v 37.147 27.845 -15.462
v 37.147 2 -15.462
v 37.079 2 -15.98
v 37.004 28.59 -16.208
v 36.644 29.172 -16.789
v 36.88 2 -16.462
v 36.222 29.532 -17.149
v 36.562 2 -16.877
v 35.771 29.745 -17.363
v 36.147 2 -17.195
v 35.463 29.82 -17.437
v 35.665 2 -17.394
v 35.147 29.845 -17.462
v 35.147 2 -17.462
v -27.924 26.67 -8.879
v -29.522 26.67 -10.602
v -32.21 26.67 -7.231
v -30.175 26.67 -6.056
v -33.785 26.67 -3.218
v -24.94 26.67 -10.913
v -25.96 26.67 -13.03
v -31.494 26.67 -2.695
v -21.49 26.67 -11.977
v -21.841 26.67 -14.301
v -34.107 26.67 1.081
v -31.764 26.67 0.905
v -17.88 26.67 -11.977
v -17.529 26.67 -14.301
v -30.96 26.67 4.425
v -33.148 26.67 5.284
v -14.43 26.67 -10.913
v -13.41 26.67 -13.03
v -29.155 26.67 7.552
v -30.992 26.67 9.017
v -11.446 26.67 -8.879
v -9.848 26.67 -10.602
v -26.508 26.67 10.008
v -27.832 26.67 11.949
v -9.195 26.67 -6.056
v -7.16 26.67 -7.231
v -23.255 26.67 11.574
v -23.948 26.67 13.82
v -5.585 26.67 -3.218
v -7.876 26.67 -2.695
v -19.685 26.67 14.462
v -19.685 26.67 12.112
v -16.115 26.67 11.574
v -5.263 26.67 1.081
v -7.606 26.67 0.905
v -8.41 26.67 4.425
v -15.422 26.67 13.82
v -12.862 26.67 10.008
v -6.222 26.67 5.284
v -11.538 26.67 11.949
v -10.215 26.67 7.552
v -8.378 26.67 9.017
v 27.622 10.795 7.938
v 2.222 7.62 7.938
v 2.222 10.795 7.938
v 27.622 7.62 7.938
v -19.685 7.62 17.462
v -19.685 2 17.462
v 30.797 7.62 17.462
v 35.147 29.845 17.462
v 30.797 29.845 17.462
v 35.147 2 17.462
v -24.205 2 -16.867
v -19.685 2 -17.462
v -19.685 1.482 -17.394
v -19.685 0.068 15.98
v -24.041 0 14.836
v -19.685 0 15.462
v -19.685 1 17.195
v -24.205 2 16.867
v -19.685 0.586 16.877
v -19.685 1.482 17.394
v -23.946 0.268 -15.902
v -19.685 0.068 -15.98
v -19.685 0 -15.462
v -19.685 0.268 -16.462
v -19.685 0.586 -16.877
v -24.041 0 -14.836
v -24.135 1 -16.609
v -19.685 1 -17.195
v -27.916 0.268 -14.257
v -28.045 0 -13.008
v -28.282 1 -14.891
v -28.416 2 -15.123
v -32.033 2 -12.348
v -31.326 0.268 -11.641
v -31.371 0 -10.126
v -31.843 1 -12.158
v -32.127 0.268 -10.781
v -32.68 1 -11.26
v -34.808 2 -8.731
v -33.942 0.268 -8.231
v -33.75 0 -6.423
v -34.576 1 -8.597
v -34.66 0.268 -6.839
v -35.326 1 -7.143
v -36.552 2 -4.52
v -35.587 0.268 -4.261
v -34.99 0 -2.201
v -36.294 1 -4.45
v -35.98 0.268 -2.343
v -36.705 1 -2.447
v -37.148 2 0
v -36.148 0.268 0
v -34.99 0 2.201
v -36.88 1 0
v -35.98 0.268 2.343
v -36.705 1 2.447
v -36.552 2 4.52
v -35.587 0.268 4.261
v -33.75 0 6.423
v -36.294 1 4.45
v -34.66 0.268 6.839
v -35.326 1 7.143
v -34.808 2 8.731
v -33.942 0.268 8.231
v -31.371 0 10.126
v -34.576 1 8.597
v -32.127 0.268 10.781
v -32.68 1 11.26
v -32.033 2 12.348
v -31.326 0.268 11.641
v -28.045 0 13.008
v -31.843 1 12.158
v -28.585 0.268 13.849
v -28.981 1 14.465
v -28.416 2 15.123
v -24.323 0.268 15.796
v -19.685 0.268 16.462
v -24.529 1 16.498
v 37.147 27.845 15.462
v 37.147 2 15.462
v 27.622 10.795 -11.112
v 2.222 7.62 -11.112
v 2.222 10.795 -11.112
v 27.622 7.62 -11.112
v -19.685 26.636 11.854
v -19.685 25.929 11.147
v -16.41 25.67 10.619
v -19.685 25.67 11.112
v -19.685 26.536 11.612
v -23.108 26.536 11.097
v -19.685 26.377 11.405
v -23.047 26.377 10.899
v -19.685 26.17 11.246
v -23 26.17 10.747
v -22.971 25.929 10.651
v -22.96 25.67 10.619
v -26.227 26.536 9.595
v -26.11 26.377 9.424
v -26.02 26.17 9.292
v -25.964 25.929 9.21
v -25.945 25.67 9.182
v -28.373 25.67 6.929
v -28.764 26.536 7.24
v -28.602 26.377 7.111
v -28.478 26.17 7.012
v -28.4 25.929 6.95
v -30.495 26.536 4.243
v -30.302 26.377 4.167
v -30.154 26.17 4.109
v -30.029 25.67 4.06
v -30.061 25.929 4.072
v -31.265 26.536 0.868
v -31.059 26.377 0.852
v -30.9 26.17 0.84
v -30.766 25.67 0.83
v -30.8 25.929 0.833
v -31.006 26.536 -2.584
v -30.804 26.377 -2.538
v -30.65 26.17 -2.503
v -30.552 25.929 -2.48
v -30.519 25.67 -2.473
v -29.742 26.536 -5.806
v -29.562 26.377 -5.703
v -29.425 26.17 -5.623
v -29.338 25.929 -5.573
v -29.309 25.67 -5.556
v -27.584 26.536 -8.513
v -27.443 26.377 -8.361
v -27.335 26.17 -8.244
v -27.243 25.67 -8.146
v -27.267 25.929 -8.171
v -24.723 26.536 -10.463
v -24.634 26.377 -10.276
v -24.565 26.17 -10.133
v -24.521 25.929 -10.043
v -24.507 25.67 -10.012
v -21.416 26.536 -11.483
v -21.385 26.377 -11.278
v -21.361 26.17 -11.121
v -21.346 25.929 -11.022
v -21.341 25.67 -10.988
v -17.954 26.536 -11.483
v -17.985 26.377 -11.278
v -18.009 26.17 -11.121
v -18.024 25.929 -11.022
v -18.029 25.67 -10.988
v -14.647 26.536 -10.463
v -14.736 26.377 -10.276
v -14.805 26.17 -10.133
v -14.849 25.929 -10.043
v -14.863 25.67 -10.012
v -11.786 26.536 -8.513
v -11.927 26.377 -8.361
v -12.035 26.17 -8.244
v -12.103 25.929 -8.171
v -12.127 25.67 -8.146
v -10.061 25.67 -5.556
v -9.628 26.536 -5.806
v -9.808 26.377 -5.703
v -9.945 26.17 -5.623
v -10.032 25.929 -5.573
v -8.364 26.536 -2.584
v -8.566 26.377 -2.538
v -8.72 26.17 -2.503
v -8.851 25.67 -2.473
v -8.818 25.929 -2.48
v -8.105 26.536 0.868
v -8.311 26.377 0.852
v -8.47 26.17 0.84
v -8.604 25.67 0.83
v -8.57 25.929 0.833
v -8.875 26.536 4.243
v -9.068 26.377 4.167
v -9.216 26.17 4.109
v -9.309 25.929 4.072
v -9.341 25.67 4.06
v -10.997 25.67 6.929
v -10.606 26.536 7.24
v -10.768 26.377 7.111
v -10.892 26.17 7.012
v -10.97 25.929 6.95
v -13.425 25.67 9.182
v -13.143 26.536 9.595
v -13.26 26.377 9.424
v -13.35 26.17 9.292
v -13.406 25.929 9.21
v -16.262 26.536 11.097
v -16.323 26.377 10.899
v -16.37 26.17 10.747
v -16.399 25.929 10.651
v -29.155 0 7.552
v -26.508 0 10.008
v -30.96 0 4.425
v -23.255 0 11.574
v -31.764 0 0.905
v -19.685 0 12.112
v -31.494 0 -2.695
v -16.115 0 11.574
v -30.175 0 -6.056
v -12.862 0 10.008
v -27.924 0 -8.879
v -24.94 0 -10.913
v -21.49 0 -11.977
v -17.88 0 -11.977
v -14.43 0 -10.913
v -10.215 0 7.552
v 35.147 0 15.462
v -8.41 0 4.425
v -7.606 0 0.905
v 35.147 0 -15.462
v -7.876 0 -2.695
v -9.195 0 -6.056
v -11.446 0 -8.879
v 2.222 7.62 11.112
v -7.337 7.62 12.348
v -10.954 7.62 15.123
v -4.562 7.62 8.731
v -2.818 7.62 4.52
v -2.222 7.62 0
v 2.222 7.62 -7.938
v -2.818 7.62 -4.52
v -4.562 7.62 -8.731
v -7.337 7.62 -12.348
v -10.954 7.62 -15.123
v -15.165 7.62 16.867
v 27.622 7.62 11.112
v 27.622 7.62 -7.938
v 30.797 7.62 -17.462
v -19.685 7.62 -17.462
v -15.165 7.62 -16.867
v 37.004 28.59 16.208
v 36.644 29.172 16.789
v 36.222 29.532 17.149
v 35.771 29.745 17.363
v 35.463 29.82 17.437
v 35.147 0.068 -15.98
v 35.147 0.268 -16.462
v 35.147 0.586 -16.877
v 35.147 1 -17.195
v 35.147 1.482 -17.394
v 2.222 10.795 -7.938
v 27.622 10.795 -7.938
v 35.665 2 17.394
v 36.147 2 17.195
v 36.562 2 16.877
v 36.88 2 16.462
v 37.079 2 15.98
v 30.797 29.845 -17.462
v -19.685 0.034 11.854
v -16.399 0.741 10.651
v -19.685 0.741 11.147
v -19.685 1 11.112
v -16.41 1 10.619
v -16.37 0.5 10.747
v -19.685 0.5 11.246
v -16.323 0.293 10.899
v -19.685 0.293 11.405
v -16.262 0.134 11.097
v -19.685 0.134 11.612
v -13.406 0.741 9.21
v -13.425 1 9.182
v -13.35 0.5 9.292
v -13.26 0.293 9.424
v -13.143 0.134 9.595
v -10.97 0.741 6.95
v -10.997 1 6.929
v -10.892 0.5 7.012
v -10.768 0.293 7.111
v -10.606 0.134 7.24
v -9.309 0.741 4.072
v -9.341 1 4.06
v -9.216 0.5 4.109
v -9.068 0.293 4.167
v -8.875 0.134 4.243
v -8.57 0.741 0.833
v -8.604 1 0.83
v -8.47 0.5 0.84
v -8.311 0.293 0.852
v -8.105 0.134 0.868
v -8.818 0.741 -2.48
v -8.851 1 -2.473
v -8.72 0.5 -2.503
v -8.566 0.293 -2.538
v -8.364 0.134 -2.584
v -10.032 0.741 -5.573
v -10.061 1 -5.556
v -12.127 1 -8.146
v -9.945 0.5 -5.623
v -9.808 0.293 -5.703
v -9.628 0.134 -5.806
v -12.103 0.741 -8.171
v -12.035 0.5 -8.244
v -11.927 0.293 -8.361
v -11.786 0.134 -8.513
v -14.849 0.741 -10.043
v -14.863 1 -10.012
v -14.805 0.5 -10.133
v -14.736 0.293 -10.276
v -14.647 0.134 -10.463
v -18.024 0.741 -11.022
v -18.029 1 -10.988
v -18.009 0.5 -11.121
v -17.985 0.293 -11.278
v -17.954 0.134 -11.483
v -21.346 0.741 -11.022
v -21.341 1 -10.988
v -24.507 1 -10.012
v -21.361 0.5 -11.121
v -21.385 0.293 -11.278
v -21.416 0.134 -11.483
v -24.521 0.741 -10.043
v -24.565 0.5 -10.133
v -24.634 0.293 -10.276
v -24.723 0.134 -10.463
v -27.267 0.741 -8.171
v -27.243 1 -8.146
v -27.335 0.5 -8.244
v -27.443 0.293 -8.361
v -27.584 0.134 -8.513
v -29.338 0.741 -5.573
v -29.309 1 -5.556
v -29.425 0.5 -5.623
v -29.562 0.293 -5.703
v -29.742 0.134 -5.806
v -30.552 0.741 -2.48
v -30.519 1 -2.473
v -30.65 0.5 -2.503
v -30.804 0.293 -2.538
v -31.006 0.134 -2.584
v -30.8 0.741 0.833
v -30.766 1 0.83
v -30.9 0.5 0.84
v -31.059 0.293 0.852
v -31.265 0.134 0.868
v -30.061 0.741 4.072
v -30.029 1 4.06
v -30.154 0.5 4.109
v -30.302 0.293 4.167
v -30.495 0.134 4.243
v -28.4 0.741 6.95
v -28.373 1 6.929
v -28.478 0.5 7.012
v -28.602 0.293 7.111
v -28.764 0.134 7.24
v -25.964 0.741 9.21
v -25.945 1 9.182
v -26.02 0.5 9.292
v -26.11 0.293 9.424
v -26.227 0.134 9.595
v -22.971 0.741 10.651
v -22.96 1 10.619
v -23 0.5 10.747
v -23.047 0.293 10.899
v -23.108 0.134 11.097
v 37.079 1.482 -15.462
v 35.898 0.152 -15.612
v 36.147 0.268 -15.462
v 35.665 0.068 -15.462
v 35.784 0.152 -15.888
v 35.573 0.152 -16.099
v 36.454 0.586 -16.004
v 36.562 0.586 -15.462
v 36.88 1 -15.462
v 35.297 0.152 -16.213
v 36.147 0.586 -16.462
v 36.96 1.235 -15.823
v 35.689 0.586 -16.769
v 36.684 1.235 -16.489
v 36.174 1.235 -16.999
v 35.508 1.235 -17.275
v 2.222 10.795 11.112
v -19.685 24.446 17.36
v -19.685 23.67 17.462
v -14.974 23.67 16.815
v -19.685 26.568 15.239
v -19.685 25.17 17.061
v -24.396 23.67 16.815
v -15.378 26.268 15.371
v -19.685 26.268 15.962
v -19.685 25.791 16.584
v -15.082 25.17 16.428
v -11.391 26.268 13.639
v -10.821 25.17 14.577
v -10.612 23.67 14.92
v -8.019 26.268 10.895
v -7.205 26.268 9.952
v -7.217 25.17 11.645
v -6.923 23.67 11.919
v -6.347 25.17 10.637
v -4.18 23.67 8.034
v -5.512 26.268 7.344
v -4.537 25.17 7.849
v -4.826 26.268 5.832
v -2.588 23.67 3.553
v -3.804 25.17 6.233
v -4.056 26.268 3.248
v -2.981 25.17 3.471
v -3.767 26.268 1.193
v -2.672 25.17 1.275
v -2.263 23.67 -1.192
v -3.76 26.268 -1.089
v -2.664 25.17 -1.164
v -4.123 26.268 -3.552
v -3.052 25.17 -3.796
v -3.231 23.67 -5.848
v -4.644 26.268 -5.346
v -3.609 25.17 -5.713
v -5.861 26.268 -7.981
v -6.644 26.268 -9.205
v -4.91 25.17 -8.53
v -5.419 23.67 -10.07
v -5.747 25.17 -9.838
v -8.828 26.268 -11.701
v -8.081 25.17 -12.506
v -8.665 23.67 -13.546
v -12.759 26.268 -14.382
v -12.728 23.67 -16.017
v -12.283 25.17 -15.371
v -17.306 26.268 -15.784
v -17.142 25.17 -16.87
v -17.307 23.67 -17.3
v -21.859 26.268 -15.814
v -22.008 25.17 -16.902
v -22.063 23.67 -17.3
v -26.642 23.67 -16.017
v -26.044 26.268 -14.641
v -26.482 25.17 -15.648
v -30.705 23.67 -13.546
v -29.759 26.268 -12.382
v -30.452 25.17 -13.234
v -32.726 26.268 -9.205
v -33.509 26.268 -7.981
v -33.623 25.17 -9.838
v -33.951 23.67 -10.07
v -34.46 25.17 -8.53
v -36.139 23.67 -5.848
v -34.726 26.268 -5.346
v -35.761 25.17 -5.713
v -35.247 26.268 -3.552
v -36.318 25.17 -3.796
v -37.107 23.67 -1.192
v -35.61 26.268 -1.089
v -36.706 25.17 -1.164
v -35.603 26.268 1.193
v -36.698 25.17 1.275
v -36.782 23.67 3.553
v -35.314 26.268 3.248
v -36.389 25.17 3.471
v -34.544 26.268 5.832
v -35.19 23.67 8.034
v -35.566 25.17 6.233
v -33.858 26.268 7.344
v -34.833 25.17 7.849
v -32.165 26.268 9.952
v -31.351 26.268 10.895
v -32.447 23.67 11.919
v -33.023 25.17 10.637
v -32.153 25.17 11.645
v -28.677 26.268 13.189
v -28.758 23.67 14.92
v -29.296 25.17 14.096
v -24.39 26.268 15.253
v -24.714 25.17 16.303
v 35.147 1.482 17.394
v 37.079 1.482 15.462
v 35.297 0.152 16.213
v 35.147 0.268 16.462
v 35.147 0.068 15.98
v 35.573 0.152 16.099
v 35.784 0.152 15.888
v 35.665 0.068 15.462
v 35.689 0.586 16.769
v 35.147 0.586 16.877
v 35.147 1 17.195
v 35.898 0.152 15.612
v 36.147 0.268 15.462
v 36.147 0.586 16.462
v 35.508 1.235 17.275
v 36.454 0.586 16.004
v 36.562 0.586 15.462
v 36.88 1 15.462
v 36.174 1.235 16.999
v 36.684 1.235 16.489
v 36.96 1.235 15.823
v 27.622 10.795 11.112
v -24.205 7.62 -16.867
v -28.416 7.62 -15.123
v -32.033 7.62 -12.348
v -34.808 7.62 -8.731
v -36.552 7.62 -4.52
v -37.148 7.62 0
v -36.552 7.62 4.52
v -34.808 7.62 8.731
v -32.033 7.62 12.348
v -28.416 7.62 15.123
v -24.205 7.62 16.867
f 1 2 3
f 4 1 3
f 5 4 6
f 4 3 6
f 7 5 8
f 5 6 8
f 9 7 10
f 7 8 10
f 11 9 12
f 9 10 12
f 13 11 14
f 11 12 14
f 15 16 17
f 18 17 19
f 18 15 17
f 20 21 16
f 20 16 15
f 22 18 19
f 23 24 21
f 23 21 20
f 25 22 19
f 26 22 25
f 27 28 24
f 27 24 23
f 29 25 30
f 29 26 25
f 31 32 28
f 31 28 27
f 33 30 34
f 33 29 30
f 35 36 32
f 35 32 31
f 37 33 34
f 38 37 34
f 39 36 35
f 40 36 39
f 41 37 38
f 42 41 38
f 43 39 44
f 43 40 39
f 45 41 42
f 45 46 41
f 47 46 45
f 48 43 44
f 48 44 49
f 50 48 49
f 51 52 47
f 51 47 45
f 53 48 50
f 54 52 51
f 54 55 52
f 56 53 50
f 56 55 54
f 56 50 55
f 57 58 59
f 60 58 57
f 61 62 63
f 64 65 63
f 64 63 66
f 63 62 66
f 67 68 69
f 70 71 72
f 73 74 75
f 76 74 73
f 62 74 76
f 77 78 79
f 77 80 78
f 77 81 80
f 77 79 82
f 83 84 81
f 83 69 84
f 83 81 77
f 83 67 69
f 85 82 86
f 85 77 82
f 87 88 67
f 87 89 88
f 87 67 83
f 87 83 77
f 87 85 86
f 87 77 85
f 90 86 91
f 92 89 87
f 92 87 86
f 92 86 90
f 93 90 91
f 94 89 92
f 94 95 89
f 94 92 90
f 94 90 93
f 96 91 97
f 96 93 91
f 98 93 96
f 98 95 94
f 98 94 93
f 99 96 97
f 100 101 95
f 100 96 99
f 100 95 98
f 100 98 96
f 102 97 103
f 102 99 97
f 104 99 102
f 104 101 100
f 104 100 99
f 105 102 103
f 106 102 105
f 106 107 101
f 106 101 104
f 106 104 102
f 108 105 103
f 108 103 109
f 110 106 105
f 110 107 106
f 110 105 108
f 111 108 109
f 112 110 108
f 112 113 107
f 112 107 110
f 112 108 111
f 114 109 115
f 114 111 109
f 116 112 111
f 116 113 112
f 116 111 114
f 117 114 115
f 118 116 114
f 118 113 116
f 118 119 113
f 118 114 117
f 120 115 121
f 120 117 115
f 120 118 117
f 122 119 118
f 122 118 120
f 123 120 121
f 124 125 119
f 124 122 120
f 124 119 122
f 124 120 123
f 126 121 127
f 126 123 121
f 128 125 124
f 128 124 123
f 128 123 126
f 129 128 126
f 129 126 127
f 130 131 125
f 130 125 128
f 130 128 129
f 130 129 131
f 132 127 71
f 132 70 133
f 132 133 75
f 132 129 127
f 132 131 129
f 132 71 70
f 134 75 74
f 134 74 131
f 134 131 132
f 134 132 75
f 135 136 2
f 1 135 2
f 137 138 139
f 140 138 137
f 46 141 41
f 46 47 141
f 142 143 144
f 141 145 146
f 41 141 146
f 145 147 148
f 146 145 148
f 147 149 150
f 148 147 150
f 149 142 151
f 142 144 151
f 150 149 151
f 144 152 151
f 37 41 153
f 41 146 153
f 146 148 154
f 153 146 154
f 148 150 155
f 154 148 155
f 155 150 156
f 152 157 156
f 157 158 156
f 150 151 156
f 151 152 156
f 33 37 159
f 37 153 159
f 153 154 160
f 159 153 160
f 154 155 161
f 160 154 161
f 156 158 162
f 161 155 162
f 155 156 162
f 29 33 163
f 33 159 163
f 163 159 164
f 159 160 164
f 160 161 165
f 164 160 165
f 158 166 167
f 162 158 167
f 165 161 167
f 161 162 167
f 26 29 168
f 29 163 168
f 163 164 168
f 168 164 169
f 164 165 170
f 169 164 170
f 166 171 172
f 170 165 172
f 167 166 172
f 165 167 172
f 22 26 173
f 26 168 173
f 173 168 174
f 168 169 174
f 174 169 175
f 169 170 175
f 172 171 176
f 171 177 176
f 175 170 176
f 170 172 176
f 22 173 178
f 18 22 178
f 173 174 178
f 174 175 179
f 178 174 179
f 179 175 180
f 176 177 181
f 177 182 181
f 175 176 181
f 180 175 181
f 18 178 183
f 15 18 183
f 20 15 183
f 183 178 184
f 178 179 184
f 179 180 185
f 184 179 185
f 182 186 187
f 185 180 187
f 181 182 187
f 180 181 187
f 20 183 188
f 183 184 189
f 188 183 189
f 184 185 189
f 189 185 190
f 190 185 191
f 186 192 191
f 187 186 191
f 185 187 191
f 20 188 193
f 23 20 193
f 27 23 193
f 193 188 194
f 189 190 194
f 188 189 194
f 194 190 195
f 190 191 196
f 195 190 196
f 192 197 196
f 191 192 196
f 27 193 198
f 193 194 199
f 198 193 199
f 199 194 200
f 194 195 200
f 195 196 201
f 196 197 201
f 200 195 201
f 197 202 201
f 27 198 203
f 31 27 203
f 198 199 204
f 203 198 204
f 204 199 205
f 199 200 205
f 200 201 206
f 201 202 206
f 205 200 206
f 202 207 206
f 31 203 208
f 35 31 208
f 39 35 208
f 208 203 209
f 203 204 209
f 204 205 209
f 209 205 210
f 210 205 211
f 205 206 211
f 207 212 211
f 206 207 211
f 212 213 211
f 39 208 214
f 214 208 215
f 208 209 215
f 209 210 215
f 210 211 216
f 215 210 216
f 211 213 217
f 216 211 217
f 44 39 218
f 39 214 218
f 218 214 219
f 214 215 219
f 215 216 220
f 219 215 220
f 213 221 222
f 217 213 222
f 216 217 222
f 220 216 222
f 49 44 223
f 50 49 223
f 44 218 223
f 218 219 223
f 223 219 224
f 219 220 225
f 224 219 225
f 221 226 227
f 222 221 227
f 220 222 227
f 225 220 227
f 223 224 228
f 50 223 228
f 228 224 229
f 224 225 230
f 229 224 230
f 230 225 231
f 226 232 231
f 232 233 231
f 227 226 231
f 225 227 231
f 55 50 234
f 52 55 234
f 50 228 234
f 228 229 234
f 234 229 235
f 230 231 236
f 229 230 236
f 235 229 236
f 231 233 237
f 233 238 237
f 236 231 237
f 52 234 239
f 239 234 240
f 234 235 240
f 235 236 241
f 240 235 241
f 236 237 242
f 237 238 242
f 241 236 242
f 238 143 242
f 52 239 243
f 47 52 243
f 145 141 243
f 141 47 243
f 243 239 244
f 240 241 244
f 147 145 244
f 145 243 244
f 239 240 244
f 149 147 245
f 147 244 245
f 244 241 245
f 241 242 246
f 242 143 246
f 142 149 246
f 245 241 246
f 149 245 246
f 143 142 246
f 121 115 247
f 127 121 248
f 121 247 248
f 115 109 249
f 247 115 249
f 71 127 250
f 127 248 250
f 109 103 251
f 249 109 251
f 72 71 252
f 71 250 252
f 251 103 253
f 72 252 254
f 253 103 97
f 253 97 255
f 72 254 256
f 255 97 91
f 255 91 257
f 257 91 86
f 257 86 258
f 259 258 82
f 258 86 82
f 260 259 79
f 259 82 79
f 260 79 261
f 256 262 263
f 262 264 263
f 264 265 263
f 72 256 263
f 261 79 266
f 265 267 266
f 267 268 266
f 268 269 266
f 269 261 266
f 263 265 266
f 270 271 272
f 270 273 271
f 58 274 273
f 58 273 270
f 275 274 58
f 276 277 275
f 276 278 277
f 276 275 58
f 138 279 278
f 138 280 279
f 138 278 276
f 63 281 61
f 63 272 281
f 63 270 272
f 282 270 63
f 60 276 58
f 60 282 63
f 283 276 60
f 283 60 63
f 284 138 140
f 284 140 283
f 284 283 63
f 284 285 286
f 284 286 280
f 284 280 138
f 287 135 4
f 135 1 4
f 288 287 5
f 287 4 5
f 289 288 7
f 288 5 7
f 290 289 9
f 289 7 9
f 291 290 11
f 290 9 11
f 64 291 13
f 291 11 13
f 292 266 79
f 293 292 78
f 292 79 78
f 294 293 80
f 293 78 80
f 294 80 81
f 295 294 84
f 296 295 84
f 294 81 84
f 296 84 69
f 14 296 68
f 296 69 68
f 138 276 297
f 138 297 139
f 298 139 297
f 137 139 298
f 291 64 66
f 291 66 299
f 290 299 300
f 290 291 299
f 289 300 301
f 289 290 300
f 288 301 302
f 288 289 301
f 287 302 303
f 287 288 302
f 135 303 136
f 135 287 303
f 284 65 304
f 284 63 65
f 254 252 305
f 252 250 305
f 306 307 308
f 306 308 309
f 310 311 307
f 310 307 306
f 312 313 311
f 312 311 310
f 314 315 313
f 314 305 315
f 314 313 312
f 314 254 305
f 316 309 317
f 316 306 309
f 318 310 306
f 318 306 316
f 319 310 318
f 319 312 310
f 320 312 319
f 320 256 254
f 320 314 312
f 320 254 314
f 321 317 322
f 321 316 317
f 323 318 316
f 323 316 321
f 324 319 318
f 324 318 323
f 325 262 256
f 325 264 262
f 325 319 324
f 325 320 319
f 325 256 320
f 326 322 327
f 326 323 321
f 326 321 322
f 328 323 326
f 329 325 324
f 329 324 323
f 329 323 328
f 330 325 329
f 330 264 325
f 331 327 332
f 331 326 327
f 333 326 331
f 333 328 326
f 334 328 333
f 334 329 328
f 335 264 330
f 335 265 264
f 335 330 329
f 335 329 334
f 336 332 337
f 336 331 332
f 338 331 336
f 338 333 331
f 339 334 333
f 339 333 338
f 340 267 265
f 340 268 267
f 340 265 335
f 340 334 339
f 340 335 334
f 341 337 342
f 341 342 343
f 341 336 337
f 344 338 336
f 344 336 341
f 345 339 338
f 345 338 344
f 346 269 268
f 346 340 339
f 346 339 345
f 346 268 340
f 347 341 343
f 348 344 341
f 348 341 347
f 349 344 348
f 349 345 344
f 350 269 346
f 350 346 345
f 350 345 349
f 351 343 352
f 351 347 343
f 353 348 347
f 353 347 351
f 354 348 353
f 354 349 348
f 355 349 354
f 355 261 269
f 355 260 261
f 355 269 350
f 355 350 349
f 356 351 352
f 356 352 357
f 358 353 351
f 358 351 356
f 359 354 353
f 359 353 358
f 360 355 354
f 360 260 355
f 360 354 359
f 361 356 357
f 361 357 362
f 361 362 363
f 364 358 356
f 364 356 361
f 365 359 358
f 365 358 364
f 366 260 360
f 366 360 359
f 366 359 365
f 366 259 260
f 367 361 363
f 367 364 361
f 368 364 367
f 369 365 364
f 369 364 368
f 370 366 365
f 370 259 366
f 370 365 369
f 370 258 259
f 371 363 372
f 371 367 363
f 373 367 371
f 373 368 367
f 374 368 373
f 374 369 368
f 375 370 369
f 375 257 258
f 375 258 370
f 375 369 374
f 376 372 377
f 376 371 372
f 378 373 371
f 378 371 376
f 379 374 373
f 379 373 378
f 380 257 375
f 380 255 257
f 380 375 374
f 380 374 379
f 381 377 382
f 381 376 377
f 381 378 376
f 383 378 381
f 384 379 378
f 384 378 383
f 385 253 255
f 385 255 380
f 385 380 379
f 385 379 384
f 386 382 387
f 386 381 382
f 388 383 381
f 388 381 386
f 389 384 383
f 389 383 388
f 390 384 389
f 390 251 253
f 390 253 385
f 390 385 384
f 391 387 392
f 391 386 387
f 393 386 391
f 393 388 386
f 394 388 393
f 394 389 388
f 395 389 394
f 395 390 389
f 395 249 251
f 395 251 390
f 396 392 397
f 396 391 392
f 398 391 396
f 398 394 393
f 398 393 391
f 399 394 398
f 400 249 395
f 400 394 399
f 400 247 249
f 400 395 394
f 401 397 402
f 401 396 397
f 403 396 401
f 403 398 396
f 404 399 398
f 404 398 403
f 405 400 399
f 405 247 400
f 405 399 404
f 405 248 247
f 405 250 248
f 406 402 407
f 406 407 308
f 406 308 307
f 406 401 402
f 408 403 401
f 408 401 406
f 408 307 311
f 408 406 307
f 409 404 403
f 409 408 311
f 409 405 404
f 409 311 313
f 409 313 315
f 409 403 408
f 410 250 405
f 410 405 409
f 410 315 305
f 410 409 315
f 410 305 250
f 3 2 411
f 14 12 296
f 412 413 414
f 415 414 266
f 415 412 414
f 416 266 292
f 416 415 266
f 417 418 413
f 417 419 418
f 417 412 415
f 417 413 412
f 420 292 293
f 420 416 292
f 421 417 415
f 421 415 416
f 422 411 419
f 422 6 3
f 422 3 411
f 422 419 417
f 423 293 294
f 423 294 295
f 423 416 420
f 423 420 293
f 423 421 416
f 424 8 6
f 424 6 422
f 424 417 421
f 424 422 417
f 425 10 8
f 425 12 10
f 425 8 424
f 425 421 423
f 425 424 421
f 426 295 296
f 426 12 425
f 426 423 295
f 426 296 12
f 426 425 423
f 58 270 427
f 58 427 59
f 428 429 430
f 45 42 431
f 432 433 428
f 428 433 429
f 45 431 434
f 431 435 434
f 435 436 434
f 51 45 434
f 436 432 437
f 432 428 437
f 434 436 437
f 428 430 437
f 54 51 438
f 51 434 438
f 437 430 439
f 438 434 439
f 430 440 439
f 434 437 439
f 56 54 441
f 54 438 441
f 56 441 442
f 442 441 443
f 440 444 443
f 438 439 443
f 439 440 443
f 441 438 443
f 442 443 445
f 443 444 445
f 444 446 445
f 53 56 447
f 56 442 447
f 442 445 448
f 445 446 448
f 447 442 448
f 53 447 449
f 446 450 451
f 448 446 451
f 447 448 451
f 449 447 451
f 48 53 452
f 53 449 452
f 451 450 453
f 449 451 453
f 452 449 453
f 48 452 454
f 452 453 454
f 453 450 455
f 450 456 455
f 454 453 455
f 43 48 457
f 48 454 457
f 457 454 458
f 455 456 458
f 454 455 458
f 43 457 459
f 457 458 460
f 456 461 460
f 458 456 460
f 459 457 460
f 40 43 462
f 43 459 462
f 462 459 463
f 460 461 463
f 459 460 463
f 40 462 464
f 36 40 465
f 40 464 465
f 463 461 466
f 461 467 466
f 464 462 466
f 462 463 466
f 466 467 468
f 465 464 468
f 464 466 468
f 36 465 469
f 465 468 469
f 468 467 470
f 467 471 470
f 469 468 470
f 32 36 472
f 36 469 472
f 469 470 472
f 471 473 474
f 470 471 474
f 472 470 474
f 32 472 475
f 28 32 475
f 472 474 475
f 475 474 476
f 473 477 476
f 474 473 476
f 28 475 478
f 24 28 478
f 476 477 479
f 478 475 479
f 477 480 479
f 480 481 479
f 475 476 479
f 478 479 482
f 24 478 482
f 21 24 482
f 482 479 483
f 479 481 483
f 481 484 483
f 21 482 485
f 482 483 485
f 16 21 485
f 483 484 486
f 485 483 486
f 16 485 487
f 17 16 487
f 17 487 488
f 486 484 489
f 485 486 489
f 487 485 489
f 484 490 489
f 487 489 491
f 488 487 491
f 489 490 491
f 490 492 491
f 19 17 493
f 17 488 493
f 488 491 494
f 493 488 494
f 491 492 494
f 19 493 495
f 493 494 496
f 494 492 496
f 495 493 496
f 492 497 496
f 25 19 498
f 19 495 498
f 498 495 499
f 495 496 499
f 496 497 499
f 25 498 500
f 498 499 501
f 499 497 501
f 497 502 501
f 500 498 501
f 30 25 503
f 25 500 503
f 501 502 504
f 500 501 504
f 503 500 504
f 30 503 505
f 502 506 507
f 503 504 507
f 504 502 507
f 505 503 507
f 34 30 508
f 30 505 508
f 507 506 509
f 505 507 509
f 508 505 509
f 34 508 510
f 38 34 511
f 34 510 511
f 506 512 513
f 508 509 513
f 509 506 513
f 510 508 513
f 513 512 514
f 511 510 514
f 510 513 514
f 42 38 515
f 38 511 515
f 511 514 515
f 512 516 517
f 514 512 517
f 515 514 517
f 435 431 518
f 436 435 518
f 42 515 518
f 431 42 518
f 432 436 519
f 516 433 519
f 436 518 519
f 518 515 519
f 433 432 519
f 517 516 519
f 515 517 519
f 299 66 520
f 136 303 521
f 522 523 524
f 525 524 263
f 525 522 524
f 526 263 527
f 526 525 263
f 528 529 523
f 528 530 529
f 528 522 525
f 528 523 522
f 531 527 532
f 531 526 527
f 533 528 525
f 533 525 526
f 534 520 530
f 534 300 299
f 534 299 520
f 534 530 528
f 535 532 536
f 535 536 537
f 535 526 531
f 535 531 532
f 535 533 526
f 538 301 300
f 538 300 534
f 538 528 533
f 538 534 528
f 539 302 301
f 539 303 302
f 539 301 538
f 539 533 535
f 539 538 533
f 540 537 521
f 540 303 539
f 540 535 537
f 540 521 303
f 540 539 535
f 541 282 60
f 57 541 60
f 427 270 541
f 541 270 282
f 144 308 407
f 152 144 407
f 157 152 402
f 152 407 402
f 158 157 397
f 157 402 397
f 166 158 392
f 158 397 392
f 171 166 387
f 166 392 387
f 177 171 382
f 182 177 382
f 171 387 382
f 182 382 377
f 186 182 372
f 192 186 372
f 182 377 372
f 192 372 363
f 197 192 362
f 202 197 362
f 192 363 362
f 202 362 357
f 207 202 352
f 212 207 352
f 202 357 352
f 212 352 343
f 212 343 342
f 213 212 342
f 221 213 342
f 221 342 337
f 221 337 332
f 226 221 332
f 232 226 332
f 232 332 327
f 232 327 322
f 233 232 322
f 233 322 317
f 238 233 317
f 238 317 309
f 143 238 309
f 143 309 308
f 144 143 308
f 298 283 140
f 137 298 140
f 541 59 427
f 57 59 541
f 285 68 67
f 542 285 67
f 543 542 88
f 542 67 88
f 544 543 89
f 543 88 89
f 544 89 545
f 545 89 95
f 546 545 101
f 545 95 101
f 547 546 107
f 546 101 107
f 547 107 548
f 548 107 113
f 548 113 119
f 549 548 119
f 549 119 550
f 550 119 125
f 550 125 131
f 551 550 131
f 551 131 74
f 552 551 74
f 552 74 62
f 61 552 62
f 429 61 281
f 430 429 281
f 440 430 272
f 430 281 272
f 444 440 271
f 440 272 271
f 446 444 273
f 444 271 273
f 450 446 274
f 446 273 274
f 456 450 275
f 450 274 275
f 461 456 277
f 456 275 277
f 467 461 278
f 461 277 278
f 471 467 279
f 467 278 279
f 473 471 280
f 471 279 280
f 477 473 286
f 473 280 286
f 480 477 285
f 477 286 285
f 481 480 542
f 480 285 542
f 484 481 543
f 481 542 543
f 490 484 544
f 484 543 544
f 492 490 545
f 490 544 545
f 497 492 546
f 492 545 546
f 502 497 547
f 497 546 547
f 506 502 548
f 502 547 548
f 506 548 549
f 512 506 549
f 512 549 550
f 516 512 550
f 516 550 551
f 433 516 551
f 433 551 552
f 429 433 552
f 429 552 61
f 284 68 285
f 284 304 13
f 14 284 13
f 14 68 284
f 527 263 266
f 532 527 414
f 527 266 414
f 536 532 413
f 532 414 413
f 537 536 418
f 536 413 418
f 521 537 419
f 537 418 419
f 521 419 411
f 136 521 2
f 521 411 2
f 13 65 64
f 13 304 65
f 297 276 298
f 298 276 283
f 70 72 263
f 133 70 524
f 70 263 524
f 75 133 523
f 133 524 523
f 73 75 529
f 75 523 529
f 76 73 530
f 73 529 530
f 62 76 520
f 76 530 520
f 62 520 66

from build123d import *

# Parameters (mm, degrees)
BOSS_EXTRUDE1_DEPTH = 7.62
SKETCH4_W           = 6.35
SKETCH4_H           = 34.925
BOSS_EXTRUDE3_DEPTH = 12.7
SKETCH5_R           = 11.1125
CUT_EXTRUDE1_DEPTH  = 12.7
SKETCH6_W           = 25.4
SKETCH6_H           = 3.175
BOSS_EXTRUDE4_DEPTH = 3.175
SKETCH7_W           = 25.4
SKETCH7_H           = 3.175
BOSS_EXTRUDE5_DEPTH = 3.175
SKETCH10_W          = 6.35
SKETCH10_H          = 34.925
BOSS_EXTRUDE8_DEPTH = 9.525
FILLET1_R           = 2
FILLET2_R           = 2
SKETCH11_R          = 17.4625
BOSS_EXTRUDE9_DEPTH = 19.05
SKETCH12_R          = 11.1125
CUT_EXTRUDE2_DEPTH  = 47.677899348
FILLET3_R           = 1
FILLET4_R           = 3


with BuildPart() as part:
    # Sketch1 → Boss-Extrude1 (new body)
    with BuildSketch(Plane(origin=(0, 0, 0), x_dir=(1, 0, 0), z_dir=(0, 1, 0))):
        with BuildLine():
            Line((37.1475, -17.4625), (37.1475, 17.4625))
            Line((37.1475, 17.4625), (-19.685, 17.4625))
            ThreePointArc((-19.685, 17.4625), (-37.1475, 0), (-19.685, -17.4625))
            Line((-19.685, -17.4625), (37.1475, -17.4625))
        make_face()
    extrude(amount=BOSS_EXTRUDE1_DEPTH)

    # Sketch4 → Boss-Extrude3 (add)
    with BuildSketch(Plane(origin=(0, 7.62, 0), x_dir=(1, 0, 0), z_dir=(0, 1, 0))):
        with Locations((33.9725, 0)):
            Rectangle(SKETCH4_W, SKETCH4_H)
    extrude(amount=BOSS_EXTRUDE3_DEPTH)

    # Sketch5 → Cut-Extrude1 (cut)
    with BuildSketch(Plane(origin=(0, 7.62, 0), x_dir=(1, 0, 0), z_dir=(0, 1, 0))):
        with Locations(Location((-19.685, 0, 0), (0, 0, 270))):
            Circle(SKETCH5_R)
    extrude(amount=-CUT_EXTRUDE1_DEPTH, mode=Mode.SUBTRACT)

    # Sketch6 → Boss-Extrude4 (add)
    with BuildSketch(Plane(origin=(0, 7.62, 0), x_dir=(1, 0, 0), z_dir=(0, 1, 0))):
        with Locations((14.9225, 9.525)):
            Rectangle(SKETCH6_W, SKETCH6_H)
    extrude(amount=BOSS_EXTRUDE4_DEPTH)

    # Sketch7 → Boss-Extrude5 (add)
    with BuildSketch(Plane(origin=(0, 7.62, 0), x_dir=(1, 0, 0), z_dir=(0, 1, 0))):
        with Locations((14.9225, -9.525)):
            Rectangle(SKETCH7_W, SKETCH7_H)
    extrude(amount=BOSS_EXTRUDE5_DEPTH)

    # Sketch10 → Boss-Extrude8 (add)
    with BuildSketch(Plane(origin=(0, 20.32, 0), x_dir=(1, 0, 0), z_dir=(0, 1, 0))):
        with Locations((33.9725, 0)):
            Rectangle(SKETCH10_W, SKETCH10_H)
    extrude(amount=BOSS_EXTRUDE8_DEPTH)

    # Fillet1
    fillet1_edges = [part.edges().sort_by_distance(p)[0] for p in [
        (37.1475, 29.845, 0),
        (37.1475, 14.9225, -17.4625),
        (37.1475, 14.9225, 17.4625),
    ]]
    fillet(fillet1_edges, radius=FILLET1_R)

    # Fillet2
    fillet2_edges = [part.edges().sort_by_distance(p)[0] for p in [
        (-37.1475, 0, 0),
        (7.73125, 0, 17.4625),
        (37.1475, 0, 0),
        (7.73125, 0, -17.4625),
        (36.561713562, 0, -16.876713562),
        (36.561713562, 0, 16.876713562),
    ]]
    fillet(fillet2_edges, radius=FILLET2_R)

    # Sketch11 → Boss-Extrude9 (add)
    with BuildSketch(Plane(origin=(0, 7.62, 0), x_dir=(1, 0, 0), z_dir=(0, 1, 0))):
        with Locations(Location((-19.685, 0, 0), (0, 0, 270))):
            Circle(SKETCH11_R)
    extrude(amount=BOSS_EXTRUDE9_DEPTH)

    # Sketch12 → Cut-Extrude2 (cut, through all)
    with BuildSketch(Plane(origin=(0, 7.62, 0), x_dir=(-1, 0, 0), z_dir=(0, -1, 0))):
        with Locations(Location((19.685, 0, 0), (0, 0, 270))):
            Circle(SKETCH12_R)
    extrude(amount=-CUT_EXTRUDE2_DEPTH, mode=Mode.SUBTRACT)

    # Fillet3
    fillet3_edges = [part.edges().sort_by_distance(p)[0] for p in [
        (-19.685, 26.67, -11.1125),
        (-19.685, 0, -11.1125),
    ]]
    fillet(fillet3_edges, radius=FILLET3_R)

    # Fillet4
    fillet4_edges = [part.edges().sort_by_distance(p)[0] for p in [
        (-19.685, 26.67, -17.4625),
    ]]
    fillet(fillet4_edges, radius=FILLET4_R)


solid = part.part
